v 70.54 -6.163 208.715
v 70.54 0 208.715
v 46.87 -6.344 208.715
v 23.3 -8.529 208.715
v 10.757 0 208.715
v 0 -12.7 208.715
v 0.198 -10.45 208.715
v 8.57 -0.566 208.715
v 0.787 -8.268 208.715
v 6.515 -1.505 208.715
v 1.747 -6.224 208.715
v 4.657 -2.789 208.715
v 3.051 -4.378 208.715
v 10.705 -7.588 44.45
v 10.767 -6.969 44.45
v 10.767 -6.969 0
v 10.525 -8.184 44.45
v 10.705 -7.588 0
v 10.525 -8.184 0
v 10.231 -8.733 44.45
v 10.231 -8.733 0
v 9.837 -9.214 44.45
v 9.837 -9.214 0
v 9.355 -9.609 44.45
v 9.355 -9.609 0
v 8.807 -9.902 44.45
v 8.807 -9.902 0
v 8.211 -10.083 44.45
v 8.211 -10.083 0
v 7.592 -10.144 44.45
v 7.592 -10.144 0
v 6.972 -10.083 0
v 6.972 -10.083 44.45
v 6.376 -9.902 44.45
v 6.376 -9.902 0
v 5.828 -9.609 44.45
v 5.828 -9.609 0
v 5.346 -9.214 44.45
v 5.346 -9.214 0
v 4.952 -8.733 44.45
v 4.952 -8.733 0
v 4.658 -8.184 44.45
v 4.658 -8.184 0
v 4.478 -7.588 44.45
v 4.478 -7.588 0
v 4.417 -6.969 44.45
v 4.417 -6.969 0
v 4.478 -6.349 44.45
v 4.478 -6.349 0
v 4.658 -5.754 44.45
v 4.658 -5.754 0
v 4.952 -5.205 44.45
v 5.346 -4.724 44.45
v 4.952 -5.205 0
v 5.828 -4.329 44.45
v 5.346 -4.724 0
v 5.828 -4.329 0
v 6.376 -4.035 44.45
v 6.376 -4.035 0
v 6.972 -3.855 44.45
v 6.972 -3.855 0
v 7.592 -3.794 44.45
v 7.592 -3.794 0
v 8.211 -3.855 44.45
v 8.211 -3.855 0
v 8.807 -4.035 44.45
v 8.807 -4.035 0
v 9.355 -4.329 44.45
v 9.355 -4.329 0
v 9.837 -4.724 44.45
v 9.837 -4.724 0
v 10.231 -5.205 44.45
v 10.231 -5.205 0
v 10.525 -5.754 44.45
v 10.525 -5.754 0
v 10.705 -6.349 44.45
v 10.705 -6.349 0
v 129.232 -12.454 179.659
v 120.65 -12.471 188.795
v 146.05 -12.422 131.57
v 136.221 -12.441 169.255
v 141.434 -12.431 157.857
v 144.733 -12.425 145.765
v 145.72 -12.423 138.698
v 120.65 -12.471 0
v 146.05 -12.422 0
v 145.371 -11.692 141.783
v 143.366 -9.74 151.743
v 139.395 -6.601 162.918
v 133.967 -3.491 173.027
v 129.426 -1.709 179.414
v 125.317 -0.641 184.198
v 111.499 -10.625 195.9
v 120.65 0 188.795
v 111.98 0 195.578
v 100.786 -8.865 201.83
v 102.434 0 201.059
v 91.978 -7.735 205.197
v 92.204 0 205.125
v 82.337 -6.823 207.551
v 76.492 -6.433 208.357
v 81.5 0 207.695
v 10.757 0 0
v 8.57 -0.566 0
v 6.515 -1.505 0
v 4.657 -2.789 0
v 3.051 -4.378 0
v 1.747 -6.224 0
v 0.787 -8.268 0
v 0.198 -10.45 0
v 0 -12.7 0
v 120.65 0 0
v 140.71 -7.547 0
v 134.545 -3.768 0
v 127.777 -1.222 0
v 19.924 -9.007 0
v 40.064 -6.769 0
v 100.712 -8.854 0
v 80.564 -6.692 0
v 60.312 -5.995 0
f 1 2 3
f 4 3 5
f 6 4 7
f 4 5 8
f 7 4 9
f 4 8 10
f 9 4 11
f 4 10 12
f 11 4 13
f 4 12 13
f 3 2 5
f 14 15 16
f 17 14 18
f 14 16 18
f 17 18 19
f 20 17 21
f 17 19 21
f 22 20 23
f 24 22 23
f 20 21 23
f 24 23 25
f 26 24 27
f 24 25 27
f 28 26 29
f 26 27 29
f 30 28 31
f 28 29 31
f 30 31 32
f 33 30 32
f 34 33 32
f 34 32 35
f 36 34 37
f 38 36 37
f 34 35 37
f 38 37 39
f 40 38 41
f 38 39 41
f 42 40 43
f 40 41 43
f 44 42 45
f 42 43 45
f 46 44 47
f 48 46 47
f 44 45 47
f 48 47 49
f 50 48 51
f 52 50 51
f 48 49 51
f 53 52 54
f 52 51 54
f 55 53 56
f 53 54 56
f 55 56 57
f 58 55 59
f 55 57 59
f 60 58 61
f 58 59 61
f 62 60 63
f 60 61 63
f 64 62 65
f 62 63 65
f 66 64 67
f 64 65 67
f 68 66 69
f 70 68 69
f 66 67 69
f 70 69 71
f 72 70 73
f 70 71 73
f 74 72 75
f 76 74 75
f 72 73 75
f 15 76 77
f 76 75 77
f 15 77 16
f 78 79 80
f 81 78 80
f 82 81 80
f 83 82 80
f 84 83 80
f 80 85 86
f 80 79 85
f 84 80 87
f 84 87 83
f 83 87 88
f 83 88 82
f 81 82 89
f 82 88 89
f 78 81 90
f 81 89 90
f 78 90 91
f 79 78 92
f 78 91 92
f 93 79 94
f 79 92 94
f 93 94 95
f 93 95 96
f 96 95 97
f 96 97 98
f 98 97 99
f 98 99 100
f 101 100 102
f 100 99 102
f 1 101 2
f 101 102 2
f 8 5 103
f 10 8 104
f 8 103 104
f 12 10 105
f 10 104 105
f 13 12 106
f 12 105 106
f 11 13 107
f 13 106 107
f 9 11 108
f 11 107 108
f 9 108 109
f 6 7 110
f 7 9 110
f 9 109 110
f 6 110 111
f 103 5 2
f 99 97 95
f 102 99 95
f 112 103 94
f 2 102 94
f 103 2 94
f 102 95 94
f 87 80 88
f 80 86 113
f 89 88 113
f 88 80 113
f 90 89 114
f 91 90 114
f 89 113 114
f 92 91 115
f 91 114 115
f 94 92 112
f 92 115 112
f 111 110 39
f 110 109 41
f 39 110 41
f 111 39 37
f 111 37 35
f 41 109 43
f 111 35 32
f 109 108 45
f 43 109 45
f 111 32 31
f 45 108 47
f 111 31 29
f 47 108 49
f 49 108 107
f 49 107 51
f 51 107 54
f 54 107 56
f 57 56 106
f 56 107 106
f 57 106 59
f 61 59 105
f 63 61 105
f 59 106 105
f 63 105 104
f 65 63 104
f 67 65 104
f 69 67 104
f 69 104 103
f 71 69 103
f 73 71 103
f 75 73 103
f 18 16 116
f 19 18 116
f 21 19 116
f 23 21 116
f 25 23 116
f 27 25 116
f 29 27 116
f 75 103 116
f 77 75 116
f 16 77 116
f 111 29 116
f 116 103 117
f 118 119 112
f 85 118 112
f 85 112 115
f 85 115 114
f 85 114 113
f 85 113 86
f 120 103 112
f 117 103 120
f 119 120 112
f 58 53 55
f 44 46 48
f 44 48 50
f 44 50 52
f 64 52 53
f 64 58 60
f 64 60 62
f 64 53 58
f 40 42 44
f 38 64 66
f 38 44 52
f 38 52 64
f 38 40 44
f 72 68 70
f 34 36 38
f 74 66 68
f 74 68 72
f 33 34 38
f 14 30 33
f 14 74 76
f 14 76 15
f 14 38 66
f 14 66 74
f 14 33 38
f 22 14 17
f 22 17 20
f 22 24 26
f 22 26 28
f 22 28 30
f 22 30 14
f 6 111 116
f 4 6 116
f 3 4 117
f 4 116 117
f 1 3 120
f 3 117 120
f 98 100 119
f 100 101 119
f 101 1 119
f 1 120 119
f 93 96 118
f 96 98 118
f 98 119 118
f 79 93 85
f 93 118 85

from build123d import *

# Parameters (mm, degrees)
F1_DEPTH = 12.7
F3_DEPTH = 2819.4
F4_R     = 3.175
F5_DEPTH = 44.45


with BuildPart() as f1:
    # F0 (on Front) → F1 (new body)
    with BuildSketch(Plane.XZ):
        Polygon((0, 127), (0, 0), (146.05, 0), (146.05, 131.5695), (70.539849, 208.714945), align=None)
        Polygon((0, 208.714945), (0, 127), (70.539849, 208.714945), align=None)
        with BuildLine():
            Line((70.539849, 208.714945), (146.05, 131.5695))
            ThreePointArc((146.05, 131.5695), (124.030763, 185.5445), (70.539849, 208.714945))
        make_face()
    extrude(amount=F1_DEPTH)

    # F2 (on Top) → F3 (intersect)
    with BuildSketch(Plane.XY):
        with BuildLine():
            ThreePointArc((10.757195, 0), (3.050719, -4.378233), (0, -12.7))
            ThreePointArc((0, -12.7), (60.312475, -5.995254), (120.65, -12.470686))
            Line((120.65, -12.470686), (146.05, -12.422409))
            ThreePointArc((146.05, -12.422409), (134.545033, -3.767731), (120.65, 0))
            Line((120.65, 0), (14.993685, 0))
            Line((14.993685, 0), (10.757195, 0))
        make_face()
    extrude(amount=F3_DEPTH, mode=Mode.INTERSECT)

    # F4 (on face) → F5 (cut)
    with BuildSketch(Plane(origin=(0, 0, 0), x_dir=(1, 0, 0), z_dir=(0, 0, -1))):
        with Locations((7.591504, 6.968603)):
            Circle(F4_R)
    extrude(amount=-F5_DEPTH, mode=Mode.SUBTRACT)


solid = f1.part
